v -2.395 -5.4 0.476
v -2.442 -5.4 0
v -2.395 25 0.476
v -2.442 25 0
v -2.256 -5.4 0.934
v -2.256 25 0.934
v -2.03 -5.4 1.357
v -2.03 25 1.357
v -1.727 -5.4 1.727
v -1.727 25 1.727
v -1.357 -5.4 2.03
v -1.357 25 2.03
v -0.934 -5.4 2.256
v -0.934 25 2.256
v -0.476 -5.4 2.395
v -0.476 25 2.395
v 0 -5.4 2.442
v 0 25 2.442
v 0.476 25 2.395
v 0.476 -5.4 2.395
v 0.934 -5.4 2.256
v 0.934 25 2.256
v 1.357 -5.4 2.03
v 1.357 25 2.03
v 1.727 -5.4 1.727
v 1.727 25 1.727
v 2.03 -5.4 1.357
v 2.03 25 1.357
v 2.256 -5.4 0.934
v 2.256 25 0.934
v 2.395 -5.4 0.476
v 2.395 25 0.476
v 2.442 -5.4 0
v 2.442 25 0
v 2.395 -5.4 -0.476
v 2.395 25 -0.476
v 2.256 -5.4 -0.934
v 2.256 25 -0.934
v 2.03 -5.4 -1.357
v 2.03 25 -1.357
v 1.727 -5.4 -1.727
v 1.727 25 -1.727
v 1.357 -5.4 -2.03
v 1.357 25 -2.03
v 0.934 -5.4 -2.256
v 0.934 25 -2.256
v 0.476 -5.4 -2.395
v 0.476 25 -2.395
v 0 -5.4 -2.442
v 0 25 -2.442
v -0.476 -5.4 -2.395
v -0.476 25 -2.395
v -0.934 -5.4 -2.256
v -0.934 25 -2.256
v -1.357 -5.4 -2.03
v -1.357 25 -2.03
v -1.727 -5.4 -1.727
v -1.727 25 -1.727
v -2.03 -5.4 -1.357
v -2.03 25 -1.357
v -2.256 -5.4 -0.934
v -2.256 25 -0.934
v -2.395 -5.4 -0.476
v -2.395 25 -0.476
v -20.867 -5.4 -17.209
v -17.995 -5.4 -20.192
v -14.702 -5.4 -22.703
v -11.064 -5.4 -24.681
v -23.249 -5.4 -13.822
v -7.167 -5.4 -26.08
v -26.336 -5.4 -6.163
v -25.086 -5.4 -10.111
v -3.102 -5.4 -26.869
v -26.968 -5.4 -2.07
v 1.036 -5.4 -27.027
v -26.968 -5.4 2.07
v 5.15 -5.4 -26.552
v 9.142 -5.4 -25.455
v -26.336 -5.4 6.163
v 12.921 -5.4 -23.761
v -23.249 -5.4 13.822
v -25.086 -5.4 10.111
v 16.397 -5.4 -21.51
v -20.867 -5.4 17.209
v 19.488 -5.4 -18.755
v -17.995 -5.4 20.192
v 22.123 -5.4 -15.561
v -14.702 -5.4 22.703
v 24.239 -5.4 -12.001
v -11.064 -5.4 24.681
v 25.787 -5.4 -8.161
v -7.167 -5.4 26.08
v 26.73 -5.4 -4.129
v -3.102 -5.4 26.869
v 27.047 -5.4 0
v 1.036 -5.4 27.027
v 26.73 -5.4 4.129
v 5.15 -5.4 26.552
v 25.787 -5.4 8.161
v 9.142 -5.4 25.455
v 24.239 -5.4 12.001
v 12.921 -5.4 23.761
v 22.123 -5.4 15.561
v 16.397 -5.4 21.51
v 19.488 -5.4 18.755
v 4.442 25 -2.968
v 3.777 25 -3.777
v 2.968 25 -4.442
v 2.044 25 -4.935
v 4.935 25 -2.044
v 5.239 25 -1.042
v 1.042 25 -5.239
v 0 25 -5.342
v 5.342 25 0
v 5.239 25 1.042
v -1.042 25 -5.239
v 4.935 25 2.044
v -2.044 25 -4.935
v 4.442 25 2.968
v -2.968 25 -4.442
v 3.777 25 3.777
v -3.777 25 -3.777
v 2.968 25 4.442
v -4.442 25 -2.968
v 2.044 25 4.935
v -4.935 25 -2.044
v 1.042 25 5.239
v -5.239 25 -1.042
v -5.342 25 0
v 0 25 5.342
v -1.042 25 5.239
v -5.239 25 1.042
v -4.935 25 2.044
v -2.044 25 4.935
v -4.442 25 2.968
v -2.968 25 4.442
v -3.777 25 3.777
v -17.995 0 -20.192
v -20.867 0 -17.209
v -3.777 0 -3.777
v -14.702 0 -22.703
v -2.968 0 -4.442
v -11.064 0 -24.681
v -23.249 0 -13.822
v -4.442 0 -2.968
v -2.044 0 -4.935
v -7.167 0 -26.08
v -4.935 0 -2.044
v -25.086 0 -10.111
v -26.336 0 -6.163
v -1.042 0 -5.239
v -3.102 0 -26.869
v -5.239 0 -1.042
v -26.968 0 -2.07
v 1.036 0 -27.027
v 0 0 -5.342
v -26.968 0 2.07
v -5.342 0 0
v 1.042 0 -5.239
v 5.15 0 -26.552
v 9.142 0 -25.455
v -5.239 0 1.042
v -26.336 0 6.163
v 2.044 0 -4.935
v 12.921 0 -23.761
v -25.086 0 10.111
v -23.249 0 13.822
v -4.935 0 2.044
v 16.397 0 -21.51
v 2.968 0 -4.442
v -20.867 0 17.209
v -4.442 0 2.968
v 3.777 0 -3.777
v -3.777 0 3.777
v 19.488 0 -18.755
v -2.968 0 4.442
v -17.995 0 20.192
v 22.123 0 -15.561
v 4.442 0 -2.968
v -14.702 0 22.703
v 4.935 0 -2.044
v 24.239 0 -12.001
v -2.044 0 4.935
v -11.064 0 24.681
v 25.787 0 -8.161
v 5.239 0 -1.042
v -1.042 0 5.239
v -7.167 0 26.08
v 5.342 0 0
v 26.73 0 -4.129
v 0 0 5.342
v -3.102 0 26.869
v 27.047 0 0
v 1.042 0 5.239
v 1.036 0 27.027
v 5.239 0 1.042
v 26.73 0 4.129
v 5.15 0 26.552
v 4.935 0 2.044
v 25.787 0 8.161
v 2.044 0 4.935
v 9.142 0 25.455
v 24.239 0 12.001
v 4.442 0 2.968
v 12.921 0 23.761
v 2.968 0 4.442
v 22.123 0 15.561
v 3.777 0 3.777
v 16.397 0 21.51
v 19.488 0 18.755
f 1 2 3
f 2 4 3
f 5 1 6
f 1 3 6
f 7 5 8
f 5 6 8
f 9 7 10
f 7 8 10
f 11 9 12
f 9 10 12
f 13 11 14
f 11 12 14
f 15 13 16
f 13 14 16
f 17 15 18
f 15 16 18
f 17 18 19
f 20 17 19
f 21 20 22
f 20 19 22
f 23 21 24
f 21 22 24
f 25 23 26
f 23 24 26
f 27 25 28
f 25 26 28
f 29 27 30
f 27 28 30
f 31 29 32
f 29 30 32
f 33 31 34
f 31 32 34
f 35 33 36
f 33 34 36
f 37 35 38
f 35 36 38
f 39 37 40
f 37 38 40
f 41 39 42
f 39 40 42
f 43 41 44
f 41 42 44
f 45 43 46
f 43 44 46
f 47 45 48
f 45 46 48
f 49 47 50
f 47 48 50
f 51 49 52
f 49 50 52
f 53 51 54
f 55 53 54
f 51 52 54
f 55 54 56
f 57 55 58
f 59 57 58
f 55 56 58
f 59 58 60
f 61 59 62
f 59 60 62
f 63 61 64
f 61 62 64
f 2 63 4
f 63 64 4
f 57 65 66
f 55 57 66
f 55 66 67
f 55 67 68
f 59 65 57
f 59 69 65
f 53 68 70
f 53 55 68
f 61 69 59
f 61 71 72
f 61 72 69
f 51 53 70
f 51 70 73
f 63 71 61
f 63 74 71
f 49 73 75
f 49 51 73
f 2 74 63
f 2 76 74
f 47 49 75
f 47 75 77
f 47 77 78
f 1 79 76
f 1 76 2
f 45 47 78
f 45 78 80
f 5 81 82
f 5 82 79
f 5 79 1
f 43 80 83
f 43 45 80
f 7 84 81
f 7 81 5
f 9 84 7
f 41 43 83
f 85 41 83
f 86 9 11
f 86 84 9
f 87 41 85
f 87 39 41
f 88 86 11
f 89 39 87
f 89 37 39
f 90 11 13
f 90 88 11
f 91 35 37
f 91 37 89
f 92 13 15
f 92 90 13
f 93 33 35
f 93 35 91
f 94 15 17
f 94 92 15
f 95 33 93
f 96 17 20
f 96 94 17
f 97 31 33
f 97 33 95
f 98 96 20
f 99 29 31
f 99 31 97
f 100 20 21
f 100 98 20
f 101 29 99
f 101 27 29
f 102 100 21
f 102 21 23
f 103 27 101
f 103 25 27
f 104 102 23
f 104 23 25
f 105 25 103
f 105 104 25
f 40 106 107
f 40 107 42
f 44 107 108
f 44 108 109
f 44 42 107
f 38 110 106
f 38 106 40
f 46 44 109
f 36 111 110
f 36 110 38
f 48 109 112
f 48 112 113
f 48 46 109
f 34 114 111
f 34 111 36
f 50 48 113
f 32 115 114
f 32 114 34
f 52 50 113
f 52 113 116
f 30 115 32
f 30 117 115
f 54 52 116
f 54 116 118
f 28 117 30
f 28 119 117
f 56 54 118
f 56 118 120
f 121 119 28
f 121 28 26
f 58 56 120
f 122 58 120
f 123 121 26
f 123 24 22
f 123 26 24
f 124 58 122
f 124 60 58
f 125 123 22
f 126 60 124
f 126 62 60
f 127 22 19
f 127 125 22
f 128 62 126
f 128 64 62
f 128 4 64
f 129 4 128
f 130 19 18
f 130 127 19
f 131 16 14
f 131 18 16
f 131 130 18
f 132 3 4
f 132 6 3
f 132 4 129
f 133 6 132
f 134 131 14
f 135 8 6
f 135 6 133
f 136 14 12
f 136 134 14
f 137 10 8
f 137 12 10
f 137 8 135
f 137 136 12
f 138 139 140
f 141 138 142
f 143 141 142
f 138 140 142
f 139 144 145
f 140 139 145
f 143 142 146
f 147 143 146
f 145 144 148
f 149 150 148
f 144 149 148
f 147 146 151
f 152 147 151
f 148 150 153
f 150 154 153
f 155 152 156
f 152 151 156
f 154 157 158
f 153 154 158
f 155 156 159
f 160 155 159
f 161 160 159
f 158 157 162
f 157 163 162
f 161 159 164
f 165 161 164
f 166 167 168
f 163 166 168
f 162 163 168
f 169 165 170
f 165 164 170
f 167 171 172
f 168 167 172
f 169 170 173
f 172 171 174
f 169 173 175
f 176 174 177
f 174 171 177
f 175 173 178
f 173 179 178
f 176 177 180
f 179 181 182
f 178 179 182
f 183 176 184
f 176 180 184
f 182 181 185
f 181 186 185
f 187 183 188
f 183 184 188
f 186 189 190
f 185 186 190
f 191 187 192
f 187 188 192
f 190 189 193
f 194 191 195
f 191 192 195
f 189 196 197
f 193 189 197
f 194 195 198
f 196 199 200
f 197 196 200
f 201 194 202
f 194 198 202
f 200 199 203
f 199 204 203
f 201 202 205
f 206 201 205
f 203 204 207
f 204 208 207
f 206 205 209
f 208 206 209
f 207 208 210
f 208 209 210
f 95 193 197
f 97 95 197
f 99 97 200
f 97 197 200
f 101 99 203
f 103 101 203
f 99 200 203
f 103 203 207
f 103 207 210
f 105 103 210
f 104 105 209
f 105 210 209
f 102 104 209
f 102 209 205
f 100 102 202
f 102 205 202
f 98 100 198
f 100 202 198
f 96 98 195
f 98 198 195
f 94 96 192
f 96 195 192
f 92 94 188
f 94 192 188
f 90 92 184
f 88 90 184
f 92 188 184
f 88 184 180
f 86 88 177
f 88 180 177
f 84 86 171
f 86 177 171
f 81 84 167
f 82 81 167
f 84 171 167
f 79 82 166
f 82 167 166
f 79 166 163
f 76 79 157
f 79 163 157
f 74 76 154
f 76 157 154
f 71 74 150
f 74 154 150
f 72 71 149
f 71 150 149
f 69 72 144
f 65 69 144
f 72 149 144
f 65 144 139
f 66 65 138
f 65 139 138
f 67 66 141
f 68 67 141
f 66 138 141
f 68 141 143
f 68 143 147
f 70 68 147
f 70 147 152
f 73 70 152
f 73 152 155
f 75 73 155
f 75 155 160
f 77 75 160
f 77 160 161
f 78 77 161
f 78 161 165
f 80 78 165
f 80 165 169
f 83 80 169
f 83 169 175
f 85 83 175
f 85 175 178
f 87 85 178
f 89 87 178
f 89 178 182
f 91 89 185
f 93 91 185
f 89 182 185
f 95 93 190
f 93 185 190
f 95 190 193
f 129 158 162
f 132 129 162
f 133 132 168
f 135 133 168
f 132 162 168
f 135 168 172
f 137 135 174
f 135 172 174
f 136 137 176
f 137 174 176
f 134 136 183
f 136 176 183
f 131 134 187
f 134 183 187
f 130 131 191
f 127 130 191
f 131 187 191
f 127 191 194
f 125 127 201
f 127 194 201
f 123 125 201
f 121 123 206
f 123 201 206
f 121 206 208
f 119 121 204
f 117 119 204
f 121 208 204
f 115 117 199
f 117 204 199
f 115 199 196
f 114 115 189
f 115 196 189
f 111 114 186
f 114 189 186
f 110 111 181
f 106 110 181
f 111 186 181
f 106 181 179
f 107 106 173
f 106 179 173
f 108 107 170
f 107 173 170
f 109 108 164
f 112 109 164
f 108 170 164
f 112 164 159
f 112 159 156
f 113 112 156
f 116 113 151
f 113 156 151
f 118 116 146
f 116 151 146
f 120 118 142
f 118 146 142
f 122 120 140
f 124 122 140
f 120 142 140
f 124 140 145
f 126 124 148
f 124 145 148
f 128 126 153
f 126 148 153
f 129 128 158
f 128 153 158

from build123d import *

# Parameters (mm, degrees)
F0_R     = 27.047238
F1_DEPTH = 5.4
F2_R     = 5.341981
F3_DEPTH = 25
F4_R     = 2.441964
F5_DEPTH = 48.8


with BuildPart() as f1:
    # F0 (on Front) → F1 (new body)
    with BuildSketch(Plane.XZ):
        Circle(F0_R)
    extrude(amount=F1_DEPTH)

    # F2 (on face) → F3 (join)
    with BuildSketch(Plane(origin=(0, 0, 0), x_dir=(-1, 0, 0), z_dir=(0, 1, 0))):
        Circle(F2_R)
    extrude(amount=F3_DEPTH)

    # F4 (on face) → F5 (cut, symmetric)
    with BuildSketch(Plane(origin=(0, 25, 0), x_dir=(-1, 0, 0), z_dir=(0, 1, 0))):
        Circle(F4_R)
    extrude(amount=F5_DEPTH, both=True, mode=Mode.SUBTRACT)


solid = f1.part
